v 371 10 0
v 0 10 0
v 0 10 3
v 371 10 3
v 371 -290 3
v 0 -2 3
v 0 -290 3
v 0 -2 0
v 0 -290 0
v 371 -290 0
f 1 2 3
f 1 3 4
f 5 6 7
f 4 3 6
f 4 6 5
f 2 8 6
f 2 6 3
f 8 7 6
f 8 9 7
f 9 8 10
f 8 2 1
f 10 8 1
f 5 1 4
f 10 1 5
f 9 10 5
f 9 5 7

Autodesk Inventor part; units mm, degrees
ref_plane "YZ Plane" through (0, 0, 0) normal (1, 0, 0) x (0, 1, 0)
ref_plane "XZ Plane" through (0, 0, 0) normal (0, 1, 0) x (-1, 0, 0)
ref_plane "XY Plane" through (0, 0, 0) normal (0, 0, 1) x (1, 0, 0)
sketch "Sketch1" plane through (0, 0, 0) normal (0, 0, 1) x (1, 0, 0)
  line L0 (371, -2) -> (175.4133, -2) construction
  line L1 (371, -2) -> (371, 10) construction
  line L2 (0, 10) -> (371, 10) construction
  line L3 (0, -2) -> (0, 10) construction
  line L4 (0, 10) -> (371, 10)
  line L5 (371, 10) -> (371, -290)
  line L6 (371, -290) -> (0, -290)
  line L7 (0, -290) -> (0, 10)
  line L8 (175.4133, 2) -> (175.4133, -2) projected
  line L9 (108.5867, -2) -> (0, -2) projected
  line L10 (108.5867, -2) -> (108.5867, 2) projected
  line L11 (108.5867, 2) -> (175.4133, 2) projected
extrude "Extrusion1" add sketch "Sketch1" along normal blind 3
properties part number "Bottom plate"
